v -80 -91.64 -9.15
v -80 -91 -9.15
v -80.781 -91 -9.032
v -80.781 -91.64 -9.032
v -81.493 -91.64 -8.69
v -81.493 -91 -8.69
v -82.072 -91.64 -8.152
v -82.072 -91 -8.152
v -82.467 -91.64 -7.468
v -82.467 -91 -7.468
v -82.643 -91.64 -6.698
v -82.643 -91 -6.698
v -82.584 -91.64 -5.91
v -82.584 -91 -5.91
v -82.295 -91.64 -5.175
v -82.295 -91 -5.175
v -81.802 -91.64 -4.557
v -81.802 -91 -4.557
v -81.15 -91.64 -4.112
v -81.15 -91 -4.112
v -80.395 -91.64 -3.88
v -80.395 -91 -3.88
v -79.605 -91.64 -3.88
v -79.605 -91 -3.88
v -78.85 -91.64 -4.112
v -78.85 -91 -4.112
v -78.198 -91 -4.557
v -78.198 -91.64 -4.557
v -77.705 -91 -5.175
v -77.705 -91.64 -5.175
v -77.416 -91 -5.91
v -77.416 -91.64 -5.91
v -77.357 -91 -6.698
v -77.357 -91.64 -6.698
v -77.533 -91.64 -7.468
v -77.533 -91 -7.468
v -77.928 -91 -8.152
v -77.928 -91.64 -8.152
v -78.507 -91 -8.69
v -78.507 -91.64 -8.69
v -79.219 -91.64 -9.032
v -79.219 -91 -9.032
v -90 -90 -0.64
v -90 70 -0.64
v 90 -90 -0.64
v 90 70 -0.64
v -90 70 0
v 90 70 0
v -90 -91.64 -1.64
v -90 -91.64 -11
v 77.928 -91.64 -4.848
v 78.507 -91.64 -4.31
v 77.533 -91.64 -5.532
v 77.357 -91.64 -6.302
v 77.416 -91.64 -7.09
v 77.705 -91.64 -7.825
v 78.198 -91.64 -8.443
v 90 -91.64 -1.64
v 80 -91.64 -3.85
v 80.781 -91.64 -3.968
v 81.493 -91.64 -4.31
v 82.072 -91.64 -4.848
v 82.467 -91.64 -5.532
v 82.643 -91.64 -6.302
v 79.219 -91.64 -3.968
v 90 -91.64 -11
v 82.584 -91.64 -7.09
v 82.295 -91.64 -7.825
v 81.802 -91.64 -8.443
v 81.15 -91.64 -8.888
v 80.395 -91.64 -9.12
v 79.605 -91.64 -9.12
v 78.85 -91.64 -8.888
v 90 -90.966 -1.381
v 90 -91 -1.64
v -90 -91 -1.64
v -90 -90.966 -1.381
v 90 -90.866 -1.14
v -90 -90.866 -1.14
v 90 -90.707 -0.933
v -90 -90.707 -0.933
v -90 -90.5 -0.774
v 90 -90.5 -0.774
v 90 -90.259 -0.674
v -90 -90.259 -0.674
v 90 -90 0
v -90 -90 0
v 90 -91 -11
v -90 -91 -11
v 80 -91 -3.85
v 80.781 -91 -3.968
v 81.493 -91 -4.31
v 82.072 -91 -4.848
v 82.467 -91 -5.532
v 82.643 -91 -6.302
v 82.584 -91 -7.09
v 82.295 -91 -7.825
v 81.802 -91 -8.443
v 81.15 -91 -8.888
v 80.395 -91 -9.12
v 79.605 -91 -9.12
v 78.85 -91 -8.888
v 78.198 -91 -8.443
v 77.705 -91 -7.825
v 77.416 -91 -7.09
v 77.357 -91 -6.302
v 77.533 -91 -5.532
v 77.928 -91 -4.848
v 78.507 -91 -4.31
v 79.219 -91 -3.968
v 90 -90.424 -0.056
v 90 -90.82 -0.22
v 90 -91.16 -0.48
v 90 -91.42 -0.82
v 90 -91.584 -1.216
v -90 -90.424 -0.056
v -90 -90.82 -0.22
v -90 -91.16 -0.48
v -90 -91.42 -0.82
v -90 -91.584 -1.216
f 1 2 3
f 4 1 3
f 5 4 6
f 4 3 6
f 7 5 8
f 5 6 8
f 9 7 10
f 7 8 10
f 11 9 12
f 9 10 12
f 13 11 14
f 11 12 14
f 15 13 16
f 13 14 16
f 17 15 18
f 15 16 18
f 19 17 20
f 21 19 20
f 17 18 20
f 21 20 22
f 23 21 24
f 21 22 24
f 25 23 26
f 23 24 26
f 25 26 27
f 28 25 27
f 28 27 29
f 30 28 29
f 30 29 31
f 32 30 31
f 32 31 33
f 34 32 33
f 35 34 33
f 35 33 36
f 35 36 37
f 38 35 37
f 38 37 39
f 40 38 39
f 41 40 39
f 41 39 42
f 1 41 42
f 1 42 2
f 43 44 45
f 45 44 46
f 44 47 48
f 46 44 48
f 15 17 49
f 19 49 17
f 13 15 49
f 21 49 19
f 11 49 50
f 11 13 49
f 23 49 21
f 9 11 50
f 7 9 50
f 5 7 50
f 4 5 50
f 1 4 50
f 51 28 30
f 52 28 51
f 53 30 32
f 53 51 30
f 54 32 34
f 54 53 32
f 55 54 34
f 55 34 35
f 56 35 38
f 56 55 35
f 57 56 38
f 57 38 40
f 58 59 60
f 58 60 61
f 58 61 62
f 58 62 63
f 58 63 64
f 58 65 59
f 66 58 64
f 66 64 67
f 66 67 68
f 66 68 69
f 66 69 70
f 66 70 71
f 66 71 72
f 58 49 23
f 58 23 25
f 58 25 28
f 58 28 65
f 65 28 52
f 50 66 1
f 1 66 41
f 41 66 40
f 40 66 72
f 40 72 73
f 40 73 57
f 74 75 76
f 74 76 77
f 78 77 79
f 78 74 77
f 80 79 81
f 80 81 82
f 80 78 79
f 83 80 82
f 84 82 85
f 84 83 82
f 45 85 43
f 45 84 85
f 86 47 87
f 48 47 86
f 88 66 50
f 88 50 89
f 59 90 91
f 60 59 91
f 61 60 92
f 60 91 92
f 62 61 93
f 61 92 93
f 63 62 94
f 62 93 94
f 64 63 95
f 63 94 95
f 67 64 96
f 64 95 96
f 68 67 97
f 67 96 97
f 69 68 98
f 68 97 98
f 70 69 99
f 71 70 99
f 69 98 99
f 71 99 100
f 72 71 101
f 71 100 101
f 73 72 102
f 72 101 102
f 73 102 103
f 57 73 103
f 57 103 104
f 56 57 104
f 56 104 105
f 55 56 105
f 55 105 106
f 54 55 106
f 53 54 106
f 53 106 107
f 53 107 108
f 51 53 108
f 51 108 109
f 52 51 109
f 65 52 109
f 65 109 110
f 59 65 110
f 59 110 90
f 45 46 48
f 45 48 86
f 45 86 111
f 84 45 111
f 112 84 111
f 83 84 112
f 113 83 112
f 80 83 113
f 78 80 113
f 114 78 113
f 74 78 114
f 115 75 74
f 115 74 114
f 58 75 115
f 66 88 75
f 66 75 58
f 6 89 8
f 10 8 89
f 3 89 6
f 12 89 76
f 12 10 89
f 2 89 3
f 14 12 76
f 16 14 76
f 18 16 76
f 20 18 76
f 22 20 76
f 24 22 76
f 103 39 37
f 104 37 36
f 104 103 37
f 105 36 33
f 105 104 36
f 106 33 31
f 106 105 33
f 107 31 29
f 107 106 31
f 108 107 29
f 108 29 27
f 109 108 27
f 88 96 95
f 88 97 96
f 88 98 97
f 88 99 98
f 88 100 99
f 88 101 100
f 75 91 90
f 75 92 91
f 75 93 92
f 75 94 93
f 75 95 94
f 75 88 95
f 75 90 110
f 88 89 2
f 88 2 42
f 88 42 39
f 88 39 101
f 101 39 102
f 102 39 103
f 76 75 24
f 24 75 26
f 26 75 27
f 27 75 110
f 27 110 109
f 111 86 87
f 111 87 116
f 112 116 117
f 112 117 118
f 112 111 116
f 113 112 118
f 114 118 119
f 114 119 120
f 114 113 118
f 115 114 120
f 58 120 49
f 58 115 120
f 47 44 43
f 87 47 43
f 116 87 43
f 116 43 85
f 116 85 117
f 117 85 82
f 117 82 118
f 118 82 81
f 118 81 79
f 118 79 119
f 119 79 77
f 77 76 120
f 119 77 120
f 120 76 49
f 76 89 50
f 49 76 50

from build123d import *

# Parameters (mm, degrees)
SKETCH1_W          = 180
SKETCH1_H          = 160
BASE_FLANGE1_DEPTH = 0.64
EDGE_FLANGE1_DEPTH = 180
SKETCH31_R         = 2.65
CUT_EXTRUDE1_DEPTH = 185.775539507


# Sheet-metal steps are written as plain solids
with BuildPart() as part:
    # Sketch1 → Base-Flange1 (new body)
    with BuildSketch(Plane.XY):
        with Locations((0, -10)):
            Rectangle(SKETCH1_W, SKETCH1_H)
    extrude(amount=-BASE_FLANGE1_DEPTH)

    # Edge-Flange1 section (across the edge) → Edge-Flange1 (add)
    with BuildSketch(Plane(origin=(90, -91, -0.64), x_dir=(0, 1, 0), z_dir=(-1, 0, 0))):
        with BuildLine():
            Line((-0.64, 1), (-0.64, 10.36))
            Line((-0.64, 10.36), (0, 10.36))
            Line((0, 10.36), (0, 1))
            ThreePointArc((0, 1), (0.292893219, 0.292893219), (1, 0))
            Line((1, 0), (1, -0.64))
            ThreePointArc((1, -0.64), (-0.159655121, -0.159655121), (-0.64, 1))
        make_face()
    extrude(amount=EDGE_FLANGE1_DEPTH)

    # Sketch31 → Cut-Extrude1 (cut, through all)
    with BuildSketch(Plane(origin=(0, -91, 0), x_dir=(1, 0, 0), z_dir=(0, 1, 0))):
        with Locations(Location((80, 6.5, 0), (0, 0, 270))):
            Circle(SKETCH31_R)
        with Locations(Location((-80, 6.5, 0), (0, 0, 90))):
            Circle(SKETCH31_R)
    extrude(amount=-CUT_EXTRUDE1_DEPTH, mode=Mode.SUBTRACT)


solid = part.part
